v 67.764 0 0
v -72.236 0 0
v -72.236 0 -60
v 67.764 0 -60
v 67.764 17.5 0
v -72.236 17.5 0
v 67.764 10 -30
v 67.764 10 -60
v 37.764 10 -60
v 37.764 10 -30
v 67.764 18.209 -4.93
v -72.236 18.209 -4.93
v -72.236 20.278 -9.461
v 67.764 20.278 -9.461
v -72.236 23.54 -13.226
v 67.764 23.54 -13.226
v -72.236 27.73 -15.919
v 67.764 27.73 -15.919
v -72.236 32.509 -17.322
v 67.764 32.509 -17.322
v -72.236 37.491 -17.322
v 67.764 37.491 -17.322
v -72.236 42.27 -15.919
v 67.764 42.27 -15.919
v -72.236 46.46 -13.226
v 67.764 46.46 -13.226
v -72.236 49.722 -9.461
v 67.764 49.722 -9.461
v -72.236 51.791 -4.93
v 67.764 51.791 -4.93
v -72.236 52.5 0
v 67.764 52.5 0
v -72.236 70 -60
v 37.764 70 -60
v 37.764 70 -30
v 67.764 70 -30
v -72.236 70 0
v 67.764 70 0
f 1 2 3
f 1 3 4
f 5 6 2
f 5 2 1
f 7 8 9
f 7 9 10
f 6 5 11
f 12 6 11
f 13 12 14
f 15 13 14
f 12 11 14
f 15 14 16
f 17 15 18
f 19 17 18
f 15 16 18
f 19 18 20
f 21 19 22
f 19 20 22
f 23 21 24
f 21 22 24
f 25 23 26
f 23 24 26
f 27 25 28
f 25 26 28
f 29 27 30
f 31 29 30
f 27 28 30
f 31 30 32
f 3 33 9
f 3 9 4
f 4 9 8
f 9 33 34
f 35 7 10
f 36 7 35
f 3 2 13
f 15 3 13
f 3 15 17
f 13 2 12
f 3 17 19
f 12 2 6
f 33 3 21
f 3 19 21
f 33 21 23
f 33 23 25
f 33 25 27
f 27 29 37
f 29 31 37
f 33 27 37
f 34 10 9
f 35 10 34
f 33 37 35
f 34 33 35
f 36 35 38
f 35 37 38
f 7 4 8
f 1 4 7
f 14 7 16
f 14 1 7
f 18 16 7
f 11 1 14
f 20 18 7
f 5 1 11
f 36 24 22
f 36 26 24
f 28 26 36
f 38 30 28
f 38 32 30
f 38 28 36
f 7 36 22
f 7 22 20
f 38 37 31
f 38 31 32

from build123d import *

# Parameters (mm, degrees)
F0_W     = 140
F0_H     = 70
F1_DEPTH = 60
F3_DEPTH = 142
F4_W     = 60
F4_H     = 30
F5_DEPTH = 30


with BuildPart() as f1:
    # F0 (on Top) → F1 (new body)
    with BuildSketch(Plane.XY):
        with Locations((-2.236115, 35)):
            Rectangle(F0_W, F0_H)
    extrude(amount=-F1_DEPTH)

    # F2 (on face) → F3 (cut)
    with BuildSketch(Plane.YZ.offset(67.763885)):
        with BuildLine():
            ThreePointArc((17.5, 0), (35, -17.5), (52.5, 0))
            Line((52.5, 0), (17.5, 0))
        make_face()
    extrude(amount=-F3_DEPTH, mode=Mode.SUBTRACT)

    # F4 (on face) → F5 (cut)
    with BuildSketch(Plane.YZ.offset(67.763885)):
        with Locations((40, -45)):
            Rectangle(F4_W, F4_H)
    extrude(amount=-F5_DEPTH, mode=Mode.SUBTRACT)


solid = f1.part
